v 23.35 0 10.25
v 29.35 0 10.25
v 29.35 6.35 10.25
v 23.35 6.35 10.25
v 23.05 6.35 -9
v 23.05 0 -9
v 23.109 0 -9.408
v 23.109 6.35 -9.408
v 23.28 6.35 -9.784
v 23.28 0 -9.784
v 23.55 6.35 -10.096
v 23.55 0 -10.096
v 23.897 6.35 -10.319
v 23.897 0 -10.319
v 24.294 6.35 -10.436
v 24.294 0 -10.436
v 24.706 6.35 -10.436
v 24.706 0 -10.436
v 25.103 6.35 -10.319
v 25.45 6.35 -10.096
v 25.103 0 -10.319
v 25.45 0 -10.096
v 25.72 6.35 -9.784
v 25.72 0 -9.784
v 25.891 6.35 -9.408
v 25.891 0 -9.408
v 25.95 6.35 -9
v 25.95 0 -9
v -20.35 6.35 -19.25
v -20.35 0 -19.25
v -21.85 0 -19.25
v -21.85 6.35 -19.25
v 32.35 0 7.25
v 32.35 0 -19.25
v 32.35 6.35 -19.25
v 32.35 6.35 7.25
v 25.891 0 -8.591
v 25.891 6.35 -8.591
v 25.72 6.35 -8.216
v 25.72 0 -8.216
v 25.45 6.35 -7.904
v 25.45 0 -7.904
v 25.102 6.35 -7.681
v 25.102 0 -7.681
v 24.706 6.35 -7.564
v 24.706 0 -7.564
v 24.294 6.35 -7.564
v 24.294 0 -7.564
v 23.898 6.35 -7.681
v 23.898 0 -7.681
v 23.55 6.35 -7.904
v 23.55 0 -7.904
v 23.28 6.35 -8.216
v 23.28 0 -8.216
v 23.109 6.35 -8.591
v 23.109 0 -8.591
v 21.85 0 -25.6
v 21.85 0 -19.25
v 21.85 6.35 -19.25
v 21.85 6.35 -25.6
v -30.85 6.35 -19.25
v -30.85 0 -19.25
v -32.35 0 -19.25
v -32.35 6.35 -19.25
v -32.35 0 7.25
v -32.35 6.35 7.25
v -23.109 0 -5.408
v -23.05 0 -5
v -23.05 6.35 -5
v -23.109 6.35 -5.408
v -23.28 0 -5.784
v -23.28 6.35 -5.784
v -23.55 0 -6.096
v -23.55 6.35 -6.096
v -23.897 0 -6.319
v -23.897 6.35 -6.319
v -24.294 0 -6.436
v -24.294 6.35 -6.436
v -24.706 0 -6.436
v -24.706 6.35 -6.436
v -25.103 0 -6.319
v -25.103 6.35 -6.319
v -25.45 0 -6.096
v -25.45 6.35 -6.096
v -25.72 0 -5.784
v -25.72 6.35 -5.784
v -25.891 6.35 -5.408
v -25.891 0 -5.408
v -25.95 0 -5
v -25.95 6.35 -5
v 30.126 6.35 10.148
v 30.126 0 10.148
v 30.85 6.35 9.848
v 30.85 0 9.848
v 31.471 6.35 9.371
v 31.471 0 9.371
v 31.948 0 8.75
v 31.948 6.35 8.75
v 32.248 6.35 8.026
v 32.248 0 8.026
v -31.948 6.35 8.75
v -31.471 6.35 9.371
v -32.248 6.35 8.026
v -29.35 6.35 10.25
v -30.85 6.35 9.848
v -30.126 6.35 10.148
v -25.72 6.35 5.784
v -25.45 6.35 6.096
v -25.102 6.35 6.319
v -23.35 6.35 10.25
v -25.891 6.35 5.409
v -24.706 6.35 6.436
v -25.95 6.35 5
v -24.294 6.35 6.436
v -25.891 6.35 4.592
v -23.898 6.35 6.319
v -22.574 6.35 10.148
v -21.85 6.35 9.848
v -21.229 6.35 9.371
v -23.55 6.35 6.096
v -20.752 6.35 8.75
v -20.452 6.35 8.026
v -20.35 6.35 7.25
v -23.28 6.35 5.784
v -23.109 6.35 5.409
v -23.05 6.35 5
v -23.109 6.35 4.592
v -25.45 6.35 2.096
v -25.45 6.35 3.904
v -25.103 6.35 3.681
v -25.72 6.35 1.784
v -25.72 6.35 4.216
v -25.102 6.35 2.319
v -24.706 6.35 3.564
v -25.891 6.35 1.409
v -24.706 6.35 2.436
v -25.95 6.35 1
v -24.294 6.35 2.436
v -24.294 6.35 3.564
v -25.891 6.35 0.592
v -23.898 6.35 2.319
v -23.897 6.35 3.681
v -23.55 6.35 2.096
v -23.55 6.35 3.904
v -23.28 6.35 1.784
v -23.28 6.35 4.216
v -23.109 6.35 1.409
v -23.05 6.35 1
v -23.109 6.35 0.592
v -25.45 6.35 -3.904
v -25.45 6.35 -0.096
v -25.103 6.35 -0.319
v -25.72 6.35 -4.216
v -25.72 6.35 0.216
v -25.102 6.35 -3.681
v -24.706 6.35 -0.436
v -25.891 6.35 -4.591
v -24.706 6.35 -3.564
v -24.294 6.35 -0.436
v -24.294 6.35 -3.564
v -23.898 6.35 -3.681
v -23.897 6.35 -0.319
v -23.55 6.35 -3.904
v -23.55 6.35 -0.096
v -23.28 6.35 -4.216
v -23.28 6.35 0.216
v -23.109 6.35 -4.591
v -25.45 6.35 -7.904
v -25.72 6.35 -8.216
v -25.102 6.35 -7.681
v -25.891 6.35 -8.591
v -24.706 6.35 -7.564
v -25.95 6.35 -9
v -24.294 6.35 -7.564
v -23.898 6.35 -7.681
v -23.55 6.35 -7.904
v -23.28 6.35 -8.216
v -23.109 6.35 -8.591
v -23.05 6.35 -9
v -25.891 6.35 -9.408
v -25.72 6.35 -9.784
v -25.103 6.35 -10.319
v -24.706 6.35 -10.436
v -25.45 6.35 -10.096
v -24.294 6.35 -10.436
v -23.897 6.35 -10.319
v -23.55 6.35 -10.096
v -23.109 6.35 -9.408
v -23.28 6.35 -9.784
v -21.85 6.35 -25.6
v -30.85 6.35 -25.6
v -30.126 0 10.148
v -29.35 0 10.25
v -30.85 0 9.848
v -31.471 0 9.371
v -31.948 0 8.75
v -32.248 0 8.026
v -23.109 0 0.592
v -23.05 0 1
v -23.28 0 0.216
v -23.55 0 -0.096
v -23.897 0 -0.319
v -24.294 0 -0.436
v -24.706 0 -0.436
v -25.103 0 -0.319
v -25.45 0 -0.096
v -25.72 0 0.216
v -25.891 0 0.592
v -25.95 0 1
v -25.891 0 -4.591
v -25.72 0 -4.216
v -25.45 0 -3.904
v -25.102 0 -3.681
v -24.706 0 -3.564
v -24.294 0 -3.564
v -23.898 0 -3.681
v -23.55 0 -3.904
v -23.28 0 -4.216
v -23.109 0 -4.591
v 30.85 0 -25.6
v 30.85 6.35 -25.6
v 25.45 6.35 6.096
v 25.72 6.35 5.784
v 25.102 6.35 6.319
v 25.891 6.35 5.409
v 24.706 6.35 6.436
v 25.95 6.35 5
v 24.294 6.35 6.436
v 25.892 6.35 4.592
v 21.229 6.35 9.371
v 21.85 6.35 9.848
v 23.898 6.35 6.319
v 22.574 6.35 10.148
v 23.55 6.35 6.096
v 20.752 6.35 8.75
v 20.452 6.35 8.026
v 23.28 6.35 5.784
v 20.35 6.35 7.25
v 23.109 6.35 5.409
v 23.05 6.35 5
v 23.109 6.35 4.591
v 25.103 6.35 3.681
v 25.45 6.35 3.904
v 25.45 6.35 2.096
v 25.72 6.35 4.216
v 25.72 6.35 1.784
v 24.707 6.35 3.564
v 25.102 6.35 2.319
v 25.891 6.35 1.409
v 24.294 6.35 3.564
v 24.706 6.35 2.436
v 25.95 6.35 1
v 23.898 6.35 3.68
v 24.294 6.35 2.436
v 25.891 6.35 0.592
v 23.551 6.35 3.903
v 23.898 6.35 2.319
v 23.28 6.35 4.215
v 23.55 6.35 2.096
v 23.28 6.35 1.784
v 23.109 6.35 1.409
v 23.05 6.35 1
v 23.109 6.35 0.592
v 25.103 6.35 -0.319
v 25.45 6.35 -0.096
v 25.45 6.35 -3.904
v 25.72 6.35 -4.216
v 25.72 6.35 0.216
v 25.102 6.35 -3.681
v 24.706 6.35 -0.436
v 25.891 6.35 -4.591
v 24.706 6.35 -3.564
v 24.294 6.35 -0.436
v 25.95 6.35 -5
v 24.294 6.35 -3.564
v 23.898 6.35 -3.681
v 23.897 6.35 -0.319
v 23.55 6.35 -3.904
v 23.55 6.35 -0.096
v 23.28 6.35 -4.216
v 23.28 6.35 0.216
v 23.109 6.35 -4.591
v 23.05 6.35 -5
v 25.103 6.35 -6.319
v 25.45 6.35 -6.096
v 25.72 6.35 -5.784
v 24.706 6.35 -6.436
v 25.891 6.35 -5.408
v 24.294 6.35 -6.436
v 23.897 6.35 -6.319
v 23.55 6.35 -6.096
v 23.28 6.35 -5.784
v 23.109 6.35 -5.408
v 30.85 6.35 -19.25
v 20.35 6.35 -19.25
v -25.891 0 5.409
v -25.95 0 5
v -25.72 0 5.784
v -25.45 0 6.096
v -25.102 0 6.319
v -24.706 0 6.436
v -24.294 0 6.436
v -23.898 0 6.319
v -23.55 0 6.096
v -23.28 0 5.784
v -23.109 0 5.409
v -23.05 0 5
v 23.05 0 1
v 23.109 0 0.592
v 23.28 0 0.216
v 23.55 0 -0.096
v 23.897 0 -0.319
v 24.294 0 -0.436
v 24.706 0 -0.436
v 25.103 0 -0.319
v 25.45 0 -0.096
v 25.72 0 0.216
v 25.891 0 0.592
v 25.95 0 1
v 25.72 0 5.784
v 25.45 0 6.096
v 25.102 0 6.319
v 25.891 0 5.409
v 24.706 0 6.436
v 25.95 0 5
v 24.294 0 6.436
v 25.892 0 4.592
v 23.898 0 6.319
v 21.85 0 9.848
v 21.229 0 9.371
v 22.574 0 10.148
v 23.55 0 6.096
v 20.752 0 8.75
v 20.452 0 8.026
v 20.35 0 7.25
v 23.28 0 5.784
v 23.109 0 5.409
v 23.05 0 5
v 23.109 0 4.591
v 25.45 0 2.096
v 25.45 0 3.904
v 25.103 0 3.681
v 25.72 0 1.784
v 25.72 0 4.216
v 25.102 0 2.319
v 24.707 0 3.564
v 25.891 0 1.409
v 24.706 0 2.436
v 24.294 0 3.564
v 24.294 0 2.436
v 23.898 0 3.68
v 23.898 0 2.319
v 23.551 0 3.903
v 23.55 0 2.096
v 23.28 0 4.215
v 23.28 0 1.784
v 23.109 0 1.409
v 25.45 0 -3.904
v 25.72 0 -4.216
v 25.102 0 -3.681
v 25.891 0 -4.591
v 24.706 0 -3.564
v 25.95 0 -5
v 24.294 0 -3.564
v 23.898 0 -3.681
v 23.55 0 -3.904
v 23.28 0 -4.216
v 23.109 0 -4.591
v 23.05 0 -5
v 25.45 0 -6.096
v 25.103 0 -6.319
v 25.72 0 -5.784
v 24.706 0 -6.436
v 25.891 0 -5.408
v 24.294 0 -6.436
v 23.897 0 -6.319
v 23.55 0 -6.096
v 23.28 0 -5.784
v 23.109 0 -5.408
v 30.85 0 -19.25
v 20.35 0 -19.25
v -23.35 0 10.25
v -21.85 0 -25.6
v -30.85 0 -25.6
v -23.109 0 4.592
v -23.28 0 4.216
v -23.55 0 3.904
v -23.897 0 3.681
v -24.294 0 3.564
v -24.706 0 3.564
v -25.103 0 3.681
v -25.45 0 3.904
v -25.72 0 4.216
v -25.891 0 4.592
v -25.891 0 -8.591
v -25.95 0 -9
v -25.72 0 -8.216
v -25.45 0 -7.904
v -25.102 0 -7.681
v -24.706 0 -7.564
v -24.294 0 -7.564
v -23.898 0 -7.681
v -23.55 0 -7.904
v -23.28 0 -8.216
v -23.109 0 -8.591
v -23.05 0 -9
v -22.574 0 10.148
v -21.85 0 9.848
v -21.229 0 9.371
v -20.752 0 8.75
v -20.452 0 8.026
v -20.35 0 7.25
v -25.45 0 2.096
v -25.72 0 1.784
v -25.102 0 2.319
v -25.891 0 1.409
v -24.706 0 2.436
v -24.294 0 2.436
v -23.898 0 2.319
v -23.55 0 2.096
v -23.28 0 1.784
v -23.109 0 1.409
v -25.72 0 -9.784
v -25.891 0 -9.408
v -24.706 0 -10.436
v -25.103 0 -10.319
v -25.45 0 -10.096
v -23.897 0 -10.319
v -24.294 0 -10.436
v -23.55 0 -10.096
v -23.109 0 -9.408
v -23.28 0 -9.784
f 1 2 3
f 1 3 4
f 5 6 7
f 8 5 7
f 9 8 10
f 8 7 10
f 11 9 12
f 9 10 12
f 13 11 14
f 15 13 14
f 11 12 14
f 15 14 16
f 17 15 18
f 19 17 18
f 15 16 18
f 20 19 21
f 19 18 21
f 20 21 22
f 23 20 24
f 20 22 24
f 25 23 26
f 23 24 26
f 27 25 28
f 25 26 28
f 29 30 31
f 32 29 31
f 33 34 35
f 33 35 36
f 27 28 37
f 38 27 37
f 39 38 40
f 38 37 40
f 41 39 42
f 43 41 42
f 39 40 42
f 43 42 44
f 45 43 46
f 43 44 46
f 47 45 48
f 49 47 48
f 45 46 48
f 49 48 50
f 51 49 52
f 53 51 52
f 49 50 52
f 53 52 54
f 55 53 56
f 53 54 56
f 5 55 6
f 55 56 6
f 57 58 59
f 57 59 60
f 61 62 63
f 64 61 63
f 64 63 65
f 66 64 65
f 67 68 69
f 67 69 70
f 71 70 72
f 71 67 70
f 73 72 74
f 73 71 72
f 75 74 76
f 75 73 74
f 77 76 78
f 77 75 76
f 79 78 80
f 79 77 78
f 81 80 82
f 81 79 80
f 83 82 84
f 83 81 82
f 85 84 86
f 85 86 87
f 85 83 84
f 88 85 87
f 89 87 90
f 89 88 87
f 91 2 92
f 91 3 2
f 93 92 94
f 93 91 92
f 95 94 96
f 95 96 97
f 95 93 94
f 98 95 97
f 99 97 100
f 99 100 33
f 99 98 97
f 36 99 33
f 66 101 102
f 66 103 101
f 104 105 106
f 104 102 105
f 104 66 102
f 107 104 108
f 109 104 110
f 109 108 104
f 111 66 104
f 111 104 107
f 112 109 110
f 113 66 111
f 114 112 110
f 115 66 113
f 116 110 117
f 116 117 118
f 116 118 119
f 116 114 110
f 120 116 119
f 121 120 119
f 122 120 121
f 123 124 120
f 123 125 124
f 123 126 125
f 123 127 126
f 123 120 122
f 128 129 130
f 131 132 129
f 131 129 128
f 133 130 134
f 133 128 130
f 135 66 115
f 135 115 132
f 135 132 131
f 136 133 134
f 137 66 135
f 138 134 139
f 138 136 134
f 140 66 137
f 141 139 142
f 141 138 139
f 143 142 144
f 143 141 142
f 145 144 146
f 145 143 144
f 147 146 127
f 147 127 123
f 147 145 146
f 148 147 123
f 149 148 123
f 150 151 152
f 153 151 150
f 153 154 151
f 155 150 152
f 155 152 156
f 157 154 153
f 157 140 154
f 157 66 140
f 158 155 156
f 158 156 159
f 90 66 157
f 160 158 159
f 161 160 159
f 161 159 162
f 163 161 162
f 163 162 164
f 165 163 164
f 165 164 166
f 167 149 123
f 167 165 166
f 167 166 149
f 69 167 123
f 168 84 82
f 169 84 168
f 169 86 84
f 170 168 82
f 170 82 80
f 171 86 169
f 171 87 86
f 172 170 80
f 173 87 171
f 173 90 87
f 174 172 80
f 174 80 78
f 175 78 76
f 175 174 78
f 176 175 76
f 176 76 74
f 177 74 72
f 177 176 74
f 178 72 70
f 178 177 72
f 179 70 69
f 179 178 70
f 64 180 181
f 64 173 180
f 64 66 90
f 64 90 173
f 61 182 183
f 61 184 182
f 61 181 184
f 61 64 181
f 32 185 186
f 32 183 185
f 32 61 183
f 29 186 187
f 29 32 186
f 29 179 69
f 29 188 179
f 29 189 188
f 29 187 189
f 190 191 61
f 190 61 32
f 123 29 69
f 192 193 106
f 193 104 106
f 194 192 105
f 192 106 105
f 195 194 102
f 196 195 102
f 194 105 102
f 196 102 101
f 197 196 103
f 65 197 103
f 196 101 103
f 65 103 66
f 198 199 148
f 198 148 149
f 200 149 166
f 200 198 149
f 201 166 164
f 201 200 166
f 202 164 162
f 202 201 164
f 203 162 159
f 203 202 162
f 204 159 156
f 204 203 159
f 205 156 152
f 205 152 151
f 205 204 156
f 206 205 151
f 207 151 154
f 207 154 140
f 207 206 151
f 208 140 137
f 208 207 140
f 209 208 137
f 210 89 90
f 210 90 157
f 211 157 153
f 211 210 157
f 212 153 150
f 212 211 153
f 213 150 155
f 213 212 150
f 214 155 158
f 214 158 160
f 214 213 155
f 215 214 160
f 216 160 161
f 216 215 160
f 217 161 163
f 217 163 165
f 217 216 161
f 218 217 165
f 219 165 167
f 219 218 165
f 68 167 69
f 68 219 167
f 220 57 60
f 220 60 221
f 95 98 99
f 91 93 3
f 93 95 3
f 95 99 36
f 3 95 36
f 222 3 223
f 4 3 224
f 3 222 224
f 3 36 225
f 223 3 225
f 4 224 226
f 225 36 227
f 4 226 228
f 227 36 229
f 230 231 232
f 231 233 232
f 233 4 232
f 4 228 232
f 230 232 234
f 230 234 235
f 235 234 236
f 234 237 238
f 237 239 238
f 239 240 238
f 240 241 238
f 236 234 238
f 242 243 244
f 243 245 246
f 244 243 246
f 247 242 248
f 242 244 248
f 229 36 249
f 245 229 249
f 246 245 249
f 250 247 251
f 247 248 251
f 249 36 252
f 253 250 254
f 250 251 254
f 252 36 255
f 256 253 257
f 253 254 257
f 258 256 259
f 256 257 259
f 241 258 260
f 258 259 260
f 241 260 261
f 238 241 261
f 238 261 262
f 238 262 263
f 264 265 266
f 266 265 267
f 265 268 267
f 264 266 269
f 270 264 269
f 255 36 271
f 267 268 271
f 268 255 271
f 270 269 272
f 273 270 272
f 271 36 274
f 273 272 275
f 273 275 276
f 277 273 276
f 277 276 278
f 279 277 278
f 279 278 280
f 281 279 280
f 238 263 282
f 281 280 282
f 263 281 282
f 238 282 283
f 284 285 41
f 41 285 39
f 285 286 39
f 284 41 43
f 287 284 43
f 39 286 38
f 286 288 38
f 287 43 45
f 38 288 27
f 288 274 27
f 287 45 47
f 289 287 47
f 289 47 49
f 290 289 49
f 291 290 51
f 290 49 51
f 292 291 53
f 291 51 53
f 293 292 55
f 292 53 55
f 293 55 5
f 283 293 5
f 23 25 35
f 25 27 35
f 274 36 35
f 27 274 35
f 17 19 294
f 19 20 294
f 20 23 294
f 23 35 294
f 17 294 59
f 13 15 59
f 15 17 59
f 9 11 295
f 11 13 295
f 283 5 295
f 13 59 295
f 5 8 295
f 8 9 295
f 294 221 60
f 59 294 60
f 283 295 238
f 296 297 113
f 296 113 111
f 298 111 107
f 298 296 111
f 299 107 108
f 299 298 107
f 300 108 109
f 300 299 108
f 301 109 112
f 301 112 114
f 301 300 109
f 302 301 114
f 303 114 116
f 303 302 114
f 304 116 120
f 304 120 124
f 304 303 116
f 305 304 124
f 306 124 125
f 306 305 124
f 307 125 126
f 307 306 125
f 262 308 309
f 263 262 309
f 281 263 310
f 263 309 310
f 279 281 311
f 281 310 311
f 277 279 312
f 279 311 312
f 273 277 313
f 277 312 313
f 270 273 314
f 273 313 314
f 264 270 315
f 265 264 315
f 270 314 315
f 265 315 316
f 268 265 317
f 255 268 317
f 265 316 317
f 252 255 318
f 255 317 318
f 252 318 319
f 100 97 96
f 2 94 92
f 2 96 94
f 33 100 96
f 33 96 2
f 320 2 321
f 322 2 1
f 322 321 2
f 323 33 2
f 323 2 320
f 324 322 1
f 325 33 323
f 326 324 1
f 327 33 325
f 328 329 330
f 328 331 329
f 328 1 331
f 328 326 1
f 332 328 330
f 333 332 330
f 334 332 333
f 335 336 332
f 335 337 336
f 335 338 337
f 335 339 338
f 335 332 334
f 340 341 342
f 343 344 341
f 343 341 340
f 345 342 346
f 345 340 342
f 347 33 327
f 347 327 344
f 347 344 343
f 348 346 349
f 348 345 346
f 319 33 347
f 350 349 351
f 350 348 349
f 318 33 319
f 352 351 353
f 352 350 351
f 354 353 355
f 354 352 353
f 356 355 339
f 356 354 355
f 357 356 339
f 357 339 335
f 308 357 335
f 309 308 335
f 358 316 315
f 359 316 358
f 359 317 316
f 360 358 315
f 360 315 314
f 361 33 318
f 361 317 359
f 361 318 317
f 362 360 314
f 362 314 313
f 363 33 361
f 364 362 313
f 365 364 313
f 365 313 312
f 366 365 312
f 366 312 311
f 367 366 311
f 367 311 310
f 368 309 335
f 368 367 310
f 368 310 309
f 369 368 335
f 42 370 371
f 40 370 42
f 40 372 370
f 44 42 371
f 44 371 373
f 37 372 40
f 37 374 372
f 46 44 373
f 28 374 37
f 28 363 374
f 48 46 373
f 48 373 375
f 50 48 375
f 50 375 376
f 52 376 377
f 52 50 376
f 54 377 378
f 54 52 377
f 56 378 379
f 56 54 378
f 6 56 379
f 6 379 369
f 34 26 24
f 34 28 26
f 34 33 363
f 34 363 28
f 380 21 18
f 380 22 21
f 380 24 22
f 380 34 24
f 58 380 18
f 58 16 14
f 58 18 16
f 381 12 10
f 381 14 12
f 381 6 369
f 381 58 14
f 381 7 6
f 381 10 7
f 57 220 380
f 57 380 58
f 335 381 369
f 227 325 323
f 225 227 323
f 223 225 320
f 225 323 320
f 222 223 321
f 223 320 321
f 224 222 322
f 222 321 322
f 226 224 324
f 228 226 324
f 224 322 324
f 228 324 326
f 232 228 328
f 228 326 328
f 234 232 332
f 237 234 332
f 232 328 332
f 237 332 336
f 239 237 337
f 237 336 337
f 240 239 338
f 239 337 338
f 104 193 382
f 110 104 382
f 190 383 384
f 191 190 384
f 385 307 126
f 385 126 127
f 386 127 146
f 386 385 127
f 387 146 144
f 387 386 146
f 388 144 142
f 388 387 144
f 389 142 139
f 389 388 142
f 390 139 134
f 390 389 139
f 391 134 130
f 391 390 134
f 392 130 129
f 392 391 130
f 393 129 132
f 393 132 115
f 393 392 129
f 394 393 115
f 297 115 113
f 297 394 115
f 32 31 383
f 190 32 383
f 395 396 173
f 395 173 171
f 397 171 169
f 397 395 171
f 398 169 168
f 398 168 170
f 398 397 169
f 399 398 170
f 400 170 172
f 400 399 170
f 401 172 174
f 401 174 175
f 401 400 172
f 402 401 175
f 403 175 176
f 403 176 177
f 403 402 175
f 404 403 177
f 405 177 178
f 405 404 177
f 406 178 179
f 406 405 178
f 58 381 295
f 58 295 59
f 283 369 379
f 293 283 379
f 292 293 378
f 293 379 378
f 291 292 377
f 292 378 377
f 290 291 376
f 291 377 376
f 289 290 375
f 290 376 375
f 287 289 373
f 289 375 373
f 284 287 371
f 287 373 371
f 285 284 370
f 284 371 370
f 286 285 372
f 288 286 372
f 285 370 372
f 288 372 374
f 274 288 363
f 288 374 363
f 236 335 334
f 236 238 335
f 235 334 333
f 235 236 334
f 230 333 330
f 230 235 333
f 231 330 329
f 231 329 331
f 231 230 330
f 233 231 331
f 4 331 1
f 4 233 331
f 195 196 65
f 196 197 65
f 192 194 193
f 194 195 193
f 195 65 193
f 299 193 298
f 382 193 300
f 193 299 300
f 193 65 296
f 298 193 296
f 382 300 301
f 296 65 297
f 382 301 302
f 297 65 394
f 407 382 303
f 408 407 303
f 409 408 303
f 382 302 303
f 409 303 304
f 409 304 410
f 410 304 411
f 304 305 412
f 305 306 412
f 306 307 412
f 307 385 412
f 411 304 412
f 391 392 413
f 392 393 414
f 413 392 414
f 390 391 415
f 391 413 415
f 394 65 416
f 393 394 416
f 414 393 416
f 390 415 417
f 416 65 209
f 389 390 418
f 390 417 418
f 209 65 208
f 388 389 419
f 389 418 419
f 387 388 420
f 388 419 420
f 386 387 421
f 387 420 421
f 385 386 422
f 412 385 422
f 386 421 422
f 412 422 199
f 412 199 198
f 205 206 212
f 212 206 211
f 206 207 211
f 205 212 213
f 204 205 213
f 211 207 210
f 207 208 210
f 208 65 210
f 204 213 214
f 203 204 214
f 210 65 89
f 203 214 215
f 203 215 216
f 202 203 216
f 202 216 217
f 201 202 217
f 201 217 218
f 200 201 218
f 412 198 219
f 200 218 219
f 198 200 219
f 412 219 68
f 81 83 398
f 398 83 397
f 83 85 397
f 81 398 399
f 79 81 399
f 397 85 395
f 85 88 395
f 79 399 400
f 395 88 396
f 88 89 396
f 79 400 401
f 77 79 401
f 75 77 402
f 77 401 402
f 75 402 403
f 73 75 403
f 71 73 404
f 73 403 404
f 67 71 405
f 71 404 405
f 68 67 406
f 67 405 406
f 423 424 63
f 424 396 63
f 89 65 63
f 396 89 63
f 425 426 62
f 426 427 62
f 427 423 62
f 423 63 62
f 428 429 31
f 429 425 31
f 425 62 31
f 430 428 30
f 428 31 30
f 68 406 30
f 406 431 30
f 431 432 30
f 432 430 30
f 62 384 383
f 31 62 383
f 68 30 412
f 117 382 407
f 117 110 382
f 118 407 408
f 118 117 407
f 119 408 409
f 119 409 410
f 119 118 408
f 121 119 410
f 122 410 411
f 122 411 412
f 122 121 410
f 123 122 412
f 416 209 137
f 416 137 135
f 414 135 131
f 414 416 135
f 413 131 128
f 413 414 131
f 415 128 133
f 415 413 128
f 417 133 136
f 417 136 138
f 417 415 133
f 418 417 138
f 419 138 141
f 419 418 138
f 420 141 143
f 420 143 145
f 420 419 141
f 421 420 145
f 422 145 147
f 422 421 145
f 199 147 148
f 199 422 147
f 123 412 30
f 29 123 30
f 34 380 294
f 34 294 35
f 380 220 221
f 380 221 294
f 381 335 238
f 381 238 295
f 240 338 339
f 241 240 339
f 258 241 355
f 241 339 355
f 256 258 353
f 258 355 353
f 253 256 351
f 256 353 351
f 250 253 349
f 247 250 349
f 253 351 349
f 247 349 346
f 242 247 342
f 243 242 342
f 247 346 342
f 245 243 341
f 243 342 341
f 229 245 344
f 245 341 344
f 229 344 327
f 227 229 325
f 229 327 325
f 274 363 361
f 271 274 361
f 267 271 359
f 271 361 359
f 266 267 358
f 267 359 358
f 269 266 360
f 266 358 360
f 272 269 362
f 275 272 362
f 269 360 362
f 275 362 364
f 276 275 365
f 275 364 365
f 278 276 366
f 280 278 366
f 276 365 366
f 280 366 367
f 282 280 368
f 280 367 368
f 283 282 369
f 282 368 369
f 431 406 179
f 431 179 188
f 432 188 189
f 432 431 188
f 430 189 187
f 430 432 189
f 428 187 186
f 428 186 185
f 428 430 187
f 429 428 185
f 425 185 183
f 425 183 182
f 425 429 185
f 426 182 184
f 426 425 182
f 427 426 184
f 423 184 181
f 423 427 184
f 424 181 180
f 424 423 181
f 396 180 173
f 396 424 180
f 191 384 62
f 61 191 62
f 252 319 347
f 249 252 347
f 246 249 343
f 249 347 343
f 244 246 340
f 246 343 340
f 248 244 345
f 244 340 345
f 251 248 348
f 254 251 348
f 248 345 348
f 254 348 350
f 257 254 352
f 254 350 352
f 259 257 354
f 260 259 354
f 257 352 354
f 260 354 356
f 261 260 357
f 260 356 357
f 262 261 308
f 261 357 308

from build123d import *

# Parameters (mm, degrees)
BOSS_EXTRUDE1_DEPTH   = 6.35
BOSS_EXTRUDE1_2_DEPTH = 6.35
FILLET1_R             = 3
FILLET2_R             = 3


with BuildPart() as part:
    # Sketch1 → Boss-Extrude1 (new body)
    with BuildSketch(Plane(origin=(0, 0, 0), x_dir=(1, 0, 0), z_dir=(0, 1, 0))):
        Polygon((-32.35, -10.25), (-20.35, -10.25), (-20.35, 19.25), (-21.85, 19.25), (-21.85, 25.6), (-30.85, 25.6), (-30.85, 19.25), (-32.35, 19.25), align=None)
        with BuildLine():
            ThreePointArc((-25.95, 4.9995), (-24.5, 3.5495), (-23.05, 4.9995))
            ThreePointArc((-23.05, 4.9995), (-24.5, 6.4505), (-25.95, 4.9995))
        make_face(mode=Mode.SUBTRACT)
        with BuildLine():
            ThreePointArc((-25.95, -5.0005), (-24.5, -6.4505), (-23.05, -5.0005))
            ThreePointArc((-23.05, -5.0005), (-24.5, -3.5495), (-25.95, -5.0005))
        make_face(mode=Mode.SUBTRACT)
        with BuildLine():
            ThreePointArc((-25.95, -1.0005), (-24.5, -2.4505), (-23.05, -1.0005))
            ThreePointArc((-23.05, -1.0005), (-24.5, 0.4505), (-25.95, -1.0005))
        make_face(mode=Mode.SUBTRACT)
        with BuildLine():
            ThreePointArc((-25.95, 8.9995), (-24.5, 7.5495), (-23.05, 8.9995))
            ThreePointArc((-23.05, 8.9995), (-24.5, 10.4505), (-25.95, 8.9995))
        make_face(mode=Mode.SUBTRACT)
    extrude(amount=BOSS_EXTRUDE1_DEPTH)

    # Fillet1
    fillet1_edges = [part.edges().sort_by_distance(p)[0] for p in [
        (-20.35, 3.175, 10.25),
        (-32.35, 3.175, 10.25),
    ]]
    fillet(fillet1_edges, radius=FILLET1_R)


with BuildPart() as body_2:
    # Sketch1 → Boss-Extrude1 2 (new body)
    with BuildSketch(Plane(origin=(0, 0, 0), x_dir=(1, 0, 0), z_dir=(0, 1, 0))):
        Polygon((21.85, 19.25), (21.85, 25.6), (30.85, 25.6), (30.85, 19.25), (32.35, 19.25), (32.35, -10.25), (20.35, -10.25), (20.35, 19.25), align=None)
        with BuildLine():
            Line((23.05, -5.0005), (23.05, -4.9995))
            ThreePointArc((23.05, -4.9995), (24.5, -3.5495), (25.95, -5.0005))
            ThreePointArc((25.95, -5.0005), (24.5, -6.4505), (23.05, -5.0005))
        make_face(mode=Mode.SUBTRACT)
        with BuildLine():
            ThreePointArc((25.95, 4.9995), (24.5, 3.5495), (23.05, 4.9995))
            ThreePointArc((23.05, 4.9995), (24.5, 6.4505), (25.95, 4.9995))
        make_face(mode=Mode.SUBTRACT)
        with BuildLine():
            ThreePointArc((25.95, 8.9995), (24.5, 7.5495), (23.05, 8.9995))
            ThreePointArc((23.05, 8.9995), (24.5, 10.4505), (25.95, 8.9995))
        make_face(mode=Mode.SUBTRACT)
        with BuildLine():
            ThreePointArc((25.95, -1.0005), (24.5, -2.4505), (23.05, -1.0005))
            ThreePointArc((23.05, -1.0005), (24.5, 0.4505), (25.95, -1.0005))
        make_face(mode=Mode.SUBTRACT)
    extrude(amount=BOSS_EXTRUDE1_2_DEPTH)

    # Fillet2
    fillet2_edges = [body_2.edges().sort_by_distance(p)[0] for p in [
        (32.35, 3.175, 10.25),
        (20.35, 3.175, 10.25),
    ]]
    fillet(fillet2_edges, radius=FILLET2_R)


solid = Compound([part.part, body_2.part])
